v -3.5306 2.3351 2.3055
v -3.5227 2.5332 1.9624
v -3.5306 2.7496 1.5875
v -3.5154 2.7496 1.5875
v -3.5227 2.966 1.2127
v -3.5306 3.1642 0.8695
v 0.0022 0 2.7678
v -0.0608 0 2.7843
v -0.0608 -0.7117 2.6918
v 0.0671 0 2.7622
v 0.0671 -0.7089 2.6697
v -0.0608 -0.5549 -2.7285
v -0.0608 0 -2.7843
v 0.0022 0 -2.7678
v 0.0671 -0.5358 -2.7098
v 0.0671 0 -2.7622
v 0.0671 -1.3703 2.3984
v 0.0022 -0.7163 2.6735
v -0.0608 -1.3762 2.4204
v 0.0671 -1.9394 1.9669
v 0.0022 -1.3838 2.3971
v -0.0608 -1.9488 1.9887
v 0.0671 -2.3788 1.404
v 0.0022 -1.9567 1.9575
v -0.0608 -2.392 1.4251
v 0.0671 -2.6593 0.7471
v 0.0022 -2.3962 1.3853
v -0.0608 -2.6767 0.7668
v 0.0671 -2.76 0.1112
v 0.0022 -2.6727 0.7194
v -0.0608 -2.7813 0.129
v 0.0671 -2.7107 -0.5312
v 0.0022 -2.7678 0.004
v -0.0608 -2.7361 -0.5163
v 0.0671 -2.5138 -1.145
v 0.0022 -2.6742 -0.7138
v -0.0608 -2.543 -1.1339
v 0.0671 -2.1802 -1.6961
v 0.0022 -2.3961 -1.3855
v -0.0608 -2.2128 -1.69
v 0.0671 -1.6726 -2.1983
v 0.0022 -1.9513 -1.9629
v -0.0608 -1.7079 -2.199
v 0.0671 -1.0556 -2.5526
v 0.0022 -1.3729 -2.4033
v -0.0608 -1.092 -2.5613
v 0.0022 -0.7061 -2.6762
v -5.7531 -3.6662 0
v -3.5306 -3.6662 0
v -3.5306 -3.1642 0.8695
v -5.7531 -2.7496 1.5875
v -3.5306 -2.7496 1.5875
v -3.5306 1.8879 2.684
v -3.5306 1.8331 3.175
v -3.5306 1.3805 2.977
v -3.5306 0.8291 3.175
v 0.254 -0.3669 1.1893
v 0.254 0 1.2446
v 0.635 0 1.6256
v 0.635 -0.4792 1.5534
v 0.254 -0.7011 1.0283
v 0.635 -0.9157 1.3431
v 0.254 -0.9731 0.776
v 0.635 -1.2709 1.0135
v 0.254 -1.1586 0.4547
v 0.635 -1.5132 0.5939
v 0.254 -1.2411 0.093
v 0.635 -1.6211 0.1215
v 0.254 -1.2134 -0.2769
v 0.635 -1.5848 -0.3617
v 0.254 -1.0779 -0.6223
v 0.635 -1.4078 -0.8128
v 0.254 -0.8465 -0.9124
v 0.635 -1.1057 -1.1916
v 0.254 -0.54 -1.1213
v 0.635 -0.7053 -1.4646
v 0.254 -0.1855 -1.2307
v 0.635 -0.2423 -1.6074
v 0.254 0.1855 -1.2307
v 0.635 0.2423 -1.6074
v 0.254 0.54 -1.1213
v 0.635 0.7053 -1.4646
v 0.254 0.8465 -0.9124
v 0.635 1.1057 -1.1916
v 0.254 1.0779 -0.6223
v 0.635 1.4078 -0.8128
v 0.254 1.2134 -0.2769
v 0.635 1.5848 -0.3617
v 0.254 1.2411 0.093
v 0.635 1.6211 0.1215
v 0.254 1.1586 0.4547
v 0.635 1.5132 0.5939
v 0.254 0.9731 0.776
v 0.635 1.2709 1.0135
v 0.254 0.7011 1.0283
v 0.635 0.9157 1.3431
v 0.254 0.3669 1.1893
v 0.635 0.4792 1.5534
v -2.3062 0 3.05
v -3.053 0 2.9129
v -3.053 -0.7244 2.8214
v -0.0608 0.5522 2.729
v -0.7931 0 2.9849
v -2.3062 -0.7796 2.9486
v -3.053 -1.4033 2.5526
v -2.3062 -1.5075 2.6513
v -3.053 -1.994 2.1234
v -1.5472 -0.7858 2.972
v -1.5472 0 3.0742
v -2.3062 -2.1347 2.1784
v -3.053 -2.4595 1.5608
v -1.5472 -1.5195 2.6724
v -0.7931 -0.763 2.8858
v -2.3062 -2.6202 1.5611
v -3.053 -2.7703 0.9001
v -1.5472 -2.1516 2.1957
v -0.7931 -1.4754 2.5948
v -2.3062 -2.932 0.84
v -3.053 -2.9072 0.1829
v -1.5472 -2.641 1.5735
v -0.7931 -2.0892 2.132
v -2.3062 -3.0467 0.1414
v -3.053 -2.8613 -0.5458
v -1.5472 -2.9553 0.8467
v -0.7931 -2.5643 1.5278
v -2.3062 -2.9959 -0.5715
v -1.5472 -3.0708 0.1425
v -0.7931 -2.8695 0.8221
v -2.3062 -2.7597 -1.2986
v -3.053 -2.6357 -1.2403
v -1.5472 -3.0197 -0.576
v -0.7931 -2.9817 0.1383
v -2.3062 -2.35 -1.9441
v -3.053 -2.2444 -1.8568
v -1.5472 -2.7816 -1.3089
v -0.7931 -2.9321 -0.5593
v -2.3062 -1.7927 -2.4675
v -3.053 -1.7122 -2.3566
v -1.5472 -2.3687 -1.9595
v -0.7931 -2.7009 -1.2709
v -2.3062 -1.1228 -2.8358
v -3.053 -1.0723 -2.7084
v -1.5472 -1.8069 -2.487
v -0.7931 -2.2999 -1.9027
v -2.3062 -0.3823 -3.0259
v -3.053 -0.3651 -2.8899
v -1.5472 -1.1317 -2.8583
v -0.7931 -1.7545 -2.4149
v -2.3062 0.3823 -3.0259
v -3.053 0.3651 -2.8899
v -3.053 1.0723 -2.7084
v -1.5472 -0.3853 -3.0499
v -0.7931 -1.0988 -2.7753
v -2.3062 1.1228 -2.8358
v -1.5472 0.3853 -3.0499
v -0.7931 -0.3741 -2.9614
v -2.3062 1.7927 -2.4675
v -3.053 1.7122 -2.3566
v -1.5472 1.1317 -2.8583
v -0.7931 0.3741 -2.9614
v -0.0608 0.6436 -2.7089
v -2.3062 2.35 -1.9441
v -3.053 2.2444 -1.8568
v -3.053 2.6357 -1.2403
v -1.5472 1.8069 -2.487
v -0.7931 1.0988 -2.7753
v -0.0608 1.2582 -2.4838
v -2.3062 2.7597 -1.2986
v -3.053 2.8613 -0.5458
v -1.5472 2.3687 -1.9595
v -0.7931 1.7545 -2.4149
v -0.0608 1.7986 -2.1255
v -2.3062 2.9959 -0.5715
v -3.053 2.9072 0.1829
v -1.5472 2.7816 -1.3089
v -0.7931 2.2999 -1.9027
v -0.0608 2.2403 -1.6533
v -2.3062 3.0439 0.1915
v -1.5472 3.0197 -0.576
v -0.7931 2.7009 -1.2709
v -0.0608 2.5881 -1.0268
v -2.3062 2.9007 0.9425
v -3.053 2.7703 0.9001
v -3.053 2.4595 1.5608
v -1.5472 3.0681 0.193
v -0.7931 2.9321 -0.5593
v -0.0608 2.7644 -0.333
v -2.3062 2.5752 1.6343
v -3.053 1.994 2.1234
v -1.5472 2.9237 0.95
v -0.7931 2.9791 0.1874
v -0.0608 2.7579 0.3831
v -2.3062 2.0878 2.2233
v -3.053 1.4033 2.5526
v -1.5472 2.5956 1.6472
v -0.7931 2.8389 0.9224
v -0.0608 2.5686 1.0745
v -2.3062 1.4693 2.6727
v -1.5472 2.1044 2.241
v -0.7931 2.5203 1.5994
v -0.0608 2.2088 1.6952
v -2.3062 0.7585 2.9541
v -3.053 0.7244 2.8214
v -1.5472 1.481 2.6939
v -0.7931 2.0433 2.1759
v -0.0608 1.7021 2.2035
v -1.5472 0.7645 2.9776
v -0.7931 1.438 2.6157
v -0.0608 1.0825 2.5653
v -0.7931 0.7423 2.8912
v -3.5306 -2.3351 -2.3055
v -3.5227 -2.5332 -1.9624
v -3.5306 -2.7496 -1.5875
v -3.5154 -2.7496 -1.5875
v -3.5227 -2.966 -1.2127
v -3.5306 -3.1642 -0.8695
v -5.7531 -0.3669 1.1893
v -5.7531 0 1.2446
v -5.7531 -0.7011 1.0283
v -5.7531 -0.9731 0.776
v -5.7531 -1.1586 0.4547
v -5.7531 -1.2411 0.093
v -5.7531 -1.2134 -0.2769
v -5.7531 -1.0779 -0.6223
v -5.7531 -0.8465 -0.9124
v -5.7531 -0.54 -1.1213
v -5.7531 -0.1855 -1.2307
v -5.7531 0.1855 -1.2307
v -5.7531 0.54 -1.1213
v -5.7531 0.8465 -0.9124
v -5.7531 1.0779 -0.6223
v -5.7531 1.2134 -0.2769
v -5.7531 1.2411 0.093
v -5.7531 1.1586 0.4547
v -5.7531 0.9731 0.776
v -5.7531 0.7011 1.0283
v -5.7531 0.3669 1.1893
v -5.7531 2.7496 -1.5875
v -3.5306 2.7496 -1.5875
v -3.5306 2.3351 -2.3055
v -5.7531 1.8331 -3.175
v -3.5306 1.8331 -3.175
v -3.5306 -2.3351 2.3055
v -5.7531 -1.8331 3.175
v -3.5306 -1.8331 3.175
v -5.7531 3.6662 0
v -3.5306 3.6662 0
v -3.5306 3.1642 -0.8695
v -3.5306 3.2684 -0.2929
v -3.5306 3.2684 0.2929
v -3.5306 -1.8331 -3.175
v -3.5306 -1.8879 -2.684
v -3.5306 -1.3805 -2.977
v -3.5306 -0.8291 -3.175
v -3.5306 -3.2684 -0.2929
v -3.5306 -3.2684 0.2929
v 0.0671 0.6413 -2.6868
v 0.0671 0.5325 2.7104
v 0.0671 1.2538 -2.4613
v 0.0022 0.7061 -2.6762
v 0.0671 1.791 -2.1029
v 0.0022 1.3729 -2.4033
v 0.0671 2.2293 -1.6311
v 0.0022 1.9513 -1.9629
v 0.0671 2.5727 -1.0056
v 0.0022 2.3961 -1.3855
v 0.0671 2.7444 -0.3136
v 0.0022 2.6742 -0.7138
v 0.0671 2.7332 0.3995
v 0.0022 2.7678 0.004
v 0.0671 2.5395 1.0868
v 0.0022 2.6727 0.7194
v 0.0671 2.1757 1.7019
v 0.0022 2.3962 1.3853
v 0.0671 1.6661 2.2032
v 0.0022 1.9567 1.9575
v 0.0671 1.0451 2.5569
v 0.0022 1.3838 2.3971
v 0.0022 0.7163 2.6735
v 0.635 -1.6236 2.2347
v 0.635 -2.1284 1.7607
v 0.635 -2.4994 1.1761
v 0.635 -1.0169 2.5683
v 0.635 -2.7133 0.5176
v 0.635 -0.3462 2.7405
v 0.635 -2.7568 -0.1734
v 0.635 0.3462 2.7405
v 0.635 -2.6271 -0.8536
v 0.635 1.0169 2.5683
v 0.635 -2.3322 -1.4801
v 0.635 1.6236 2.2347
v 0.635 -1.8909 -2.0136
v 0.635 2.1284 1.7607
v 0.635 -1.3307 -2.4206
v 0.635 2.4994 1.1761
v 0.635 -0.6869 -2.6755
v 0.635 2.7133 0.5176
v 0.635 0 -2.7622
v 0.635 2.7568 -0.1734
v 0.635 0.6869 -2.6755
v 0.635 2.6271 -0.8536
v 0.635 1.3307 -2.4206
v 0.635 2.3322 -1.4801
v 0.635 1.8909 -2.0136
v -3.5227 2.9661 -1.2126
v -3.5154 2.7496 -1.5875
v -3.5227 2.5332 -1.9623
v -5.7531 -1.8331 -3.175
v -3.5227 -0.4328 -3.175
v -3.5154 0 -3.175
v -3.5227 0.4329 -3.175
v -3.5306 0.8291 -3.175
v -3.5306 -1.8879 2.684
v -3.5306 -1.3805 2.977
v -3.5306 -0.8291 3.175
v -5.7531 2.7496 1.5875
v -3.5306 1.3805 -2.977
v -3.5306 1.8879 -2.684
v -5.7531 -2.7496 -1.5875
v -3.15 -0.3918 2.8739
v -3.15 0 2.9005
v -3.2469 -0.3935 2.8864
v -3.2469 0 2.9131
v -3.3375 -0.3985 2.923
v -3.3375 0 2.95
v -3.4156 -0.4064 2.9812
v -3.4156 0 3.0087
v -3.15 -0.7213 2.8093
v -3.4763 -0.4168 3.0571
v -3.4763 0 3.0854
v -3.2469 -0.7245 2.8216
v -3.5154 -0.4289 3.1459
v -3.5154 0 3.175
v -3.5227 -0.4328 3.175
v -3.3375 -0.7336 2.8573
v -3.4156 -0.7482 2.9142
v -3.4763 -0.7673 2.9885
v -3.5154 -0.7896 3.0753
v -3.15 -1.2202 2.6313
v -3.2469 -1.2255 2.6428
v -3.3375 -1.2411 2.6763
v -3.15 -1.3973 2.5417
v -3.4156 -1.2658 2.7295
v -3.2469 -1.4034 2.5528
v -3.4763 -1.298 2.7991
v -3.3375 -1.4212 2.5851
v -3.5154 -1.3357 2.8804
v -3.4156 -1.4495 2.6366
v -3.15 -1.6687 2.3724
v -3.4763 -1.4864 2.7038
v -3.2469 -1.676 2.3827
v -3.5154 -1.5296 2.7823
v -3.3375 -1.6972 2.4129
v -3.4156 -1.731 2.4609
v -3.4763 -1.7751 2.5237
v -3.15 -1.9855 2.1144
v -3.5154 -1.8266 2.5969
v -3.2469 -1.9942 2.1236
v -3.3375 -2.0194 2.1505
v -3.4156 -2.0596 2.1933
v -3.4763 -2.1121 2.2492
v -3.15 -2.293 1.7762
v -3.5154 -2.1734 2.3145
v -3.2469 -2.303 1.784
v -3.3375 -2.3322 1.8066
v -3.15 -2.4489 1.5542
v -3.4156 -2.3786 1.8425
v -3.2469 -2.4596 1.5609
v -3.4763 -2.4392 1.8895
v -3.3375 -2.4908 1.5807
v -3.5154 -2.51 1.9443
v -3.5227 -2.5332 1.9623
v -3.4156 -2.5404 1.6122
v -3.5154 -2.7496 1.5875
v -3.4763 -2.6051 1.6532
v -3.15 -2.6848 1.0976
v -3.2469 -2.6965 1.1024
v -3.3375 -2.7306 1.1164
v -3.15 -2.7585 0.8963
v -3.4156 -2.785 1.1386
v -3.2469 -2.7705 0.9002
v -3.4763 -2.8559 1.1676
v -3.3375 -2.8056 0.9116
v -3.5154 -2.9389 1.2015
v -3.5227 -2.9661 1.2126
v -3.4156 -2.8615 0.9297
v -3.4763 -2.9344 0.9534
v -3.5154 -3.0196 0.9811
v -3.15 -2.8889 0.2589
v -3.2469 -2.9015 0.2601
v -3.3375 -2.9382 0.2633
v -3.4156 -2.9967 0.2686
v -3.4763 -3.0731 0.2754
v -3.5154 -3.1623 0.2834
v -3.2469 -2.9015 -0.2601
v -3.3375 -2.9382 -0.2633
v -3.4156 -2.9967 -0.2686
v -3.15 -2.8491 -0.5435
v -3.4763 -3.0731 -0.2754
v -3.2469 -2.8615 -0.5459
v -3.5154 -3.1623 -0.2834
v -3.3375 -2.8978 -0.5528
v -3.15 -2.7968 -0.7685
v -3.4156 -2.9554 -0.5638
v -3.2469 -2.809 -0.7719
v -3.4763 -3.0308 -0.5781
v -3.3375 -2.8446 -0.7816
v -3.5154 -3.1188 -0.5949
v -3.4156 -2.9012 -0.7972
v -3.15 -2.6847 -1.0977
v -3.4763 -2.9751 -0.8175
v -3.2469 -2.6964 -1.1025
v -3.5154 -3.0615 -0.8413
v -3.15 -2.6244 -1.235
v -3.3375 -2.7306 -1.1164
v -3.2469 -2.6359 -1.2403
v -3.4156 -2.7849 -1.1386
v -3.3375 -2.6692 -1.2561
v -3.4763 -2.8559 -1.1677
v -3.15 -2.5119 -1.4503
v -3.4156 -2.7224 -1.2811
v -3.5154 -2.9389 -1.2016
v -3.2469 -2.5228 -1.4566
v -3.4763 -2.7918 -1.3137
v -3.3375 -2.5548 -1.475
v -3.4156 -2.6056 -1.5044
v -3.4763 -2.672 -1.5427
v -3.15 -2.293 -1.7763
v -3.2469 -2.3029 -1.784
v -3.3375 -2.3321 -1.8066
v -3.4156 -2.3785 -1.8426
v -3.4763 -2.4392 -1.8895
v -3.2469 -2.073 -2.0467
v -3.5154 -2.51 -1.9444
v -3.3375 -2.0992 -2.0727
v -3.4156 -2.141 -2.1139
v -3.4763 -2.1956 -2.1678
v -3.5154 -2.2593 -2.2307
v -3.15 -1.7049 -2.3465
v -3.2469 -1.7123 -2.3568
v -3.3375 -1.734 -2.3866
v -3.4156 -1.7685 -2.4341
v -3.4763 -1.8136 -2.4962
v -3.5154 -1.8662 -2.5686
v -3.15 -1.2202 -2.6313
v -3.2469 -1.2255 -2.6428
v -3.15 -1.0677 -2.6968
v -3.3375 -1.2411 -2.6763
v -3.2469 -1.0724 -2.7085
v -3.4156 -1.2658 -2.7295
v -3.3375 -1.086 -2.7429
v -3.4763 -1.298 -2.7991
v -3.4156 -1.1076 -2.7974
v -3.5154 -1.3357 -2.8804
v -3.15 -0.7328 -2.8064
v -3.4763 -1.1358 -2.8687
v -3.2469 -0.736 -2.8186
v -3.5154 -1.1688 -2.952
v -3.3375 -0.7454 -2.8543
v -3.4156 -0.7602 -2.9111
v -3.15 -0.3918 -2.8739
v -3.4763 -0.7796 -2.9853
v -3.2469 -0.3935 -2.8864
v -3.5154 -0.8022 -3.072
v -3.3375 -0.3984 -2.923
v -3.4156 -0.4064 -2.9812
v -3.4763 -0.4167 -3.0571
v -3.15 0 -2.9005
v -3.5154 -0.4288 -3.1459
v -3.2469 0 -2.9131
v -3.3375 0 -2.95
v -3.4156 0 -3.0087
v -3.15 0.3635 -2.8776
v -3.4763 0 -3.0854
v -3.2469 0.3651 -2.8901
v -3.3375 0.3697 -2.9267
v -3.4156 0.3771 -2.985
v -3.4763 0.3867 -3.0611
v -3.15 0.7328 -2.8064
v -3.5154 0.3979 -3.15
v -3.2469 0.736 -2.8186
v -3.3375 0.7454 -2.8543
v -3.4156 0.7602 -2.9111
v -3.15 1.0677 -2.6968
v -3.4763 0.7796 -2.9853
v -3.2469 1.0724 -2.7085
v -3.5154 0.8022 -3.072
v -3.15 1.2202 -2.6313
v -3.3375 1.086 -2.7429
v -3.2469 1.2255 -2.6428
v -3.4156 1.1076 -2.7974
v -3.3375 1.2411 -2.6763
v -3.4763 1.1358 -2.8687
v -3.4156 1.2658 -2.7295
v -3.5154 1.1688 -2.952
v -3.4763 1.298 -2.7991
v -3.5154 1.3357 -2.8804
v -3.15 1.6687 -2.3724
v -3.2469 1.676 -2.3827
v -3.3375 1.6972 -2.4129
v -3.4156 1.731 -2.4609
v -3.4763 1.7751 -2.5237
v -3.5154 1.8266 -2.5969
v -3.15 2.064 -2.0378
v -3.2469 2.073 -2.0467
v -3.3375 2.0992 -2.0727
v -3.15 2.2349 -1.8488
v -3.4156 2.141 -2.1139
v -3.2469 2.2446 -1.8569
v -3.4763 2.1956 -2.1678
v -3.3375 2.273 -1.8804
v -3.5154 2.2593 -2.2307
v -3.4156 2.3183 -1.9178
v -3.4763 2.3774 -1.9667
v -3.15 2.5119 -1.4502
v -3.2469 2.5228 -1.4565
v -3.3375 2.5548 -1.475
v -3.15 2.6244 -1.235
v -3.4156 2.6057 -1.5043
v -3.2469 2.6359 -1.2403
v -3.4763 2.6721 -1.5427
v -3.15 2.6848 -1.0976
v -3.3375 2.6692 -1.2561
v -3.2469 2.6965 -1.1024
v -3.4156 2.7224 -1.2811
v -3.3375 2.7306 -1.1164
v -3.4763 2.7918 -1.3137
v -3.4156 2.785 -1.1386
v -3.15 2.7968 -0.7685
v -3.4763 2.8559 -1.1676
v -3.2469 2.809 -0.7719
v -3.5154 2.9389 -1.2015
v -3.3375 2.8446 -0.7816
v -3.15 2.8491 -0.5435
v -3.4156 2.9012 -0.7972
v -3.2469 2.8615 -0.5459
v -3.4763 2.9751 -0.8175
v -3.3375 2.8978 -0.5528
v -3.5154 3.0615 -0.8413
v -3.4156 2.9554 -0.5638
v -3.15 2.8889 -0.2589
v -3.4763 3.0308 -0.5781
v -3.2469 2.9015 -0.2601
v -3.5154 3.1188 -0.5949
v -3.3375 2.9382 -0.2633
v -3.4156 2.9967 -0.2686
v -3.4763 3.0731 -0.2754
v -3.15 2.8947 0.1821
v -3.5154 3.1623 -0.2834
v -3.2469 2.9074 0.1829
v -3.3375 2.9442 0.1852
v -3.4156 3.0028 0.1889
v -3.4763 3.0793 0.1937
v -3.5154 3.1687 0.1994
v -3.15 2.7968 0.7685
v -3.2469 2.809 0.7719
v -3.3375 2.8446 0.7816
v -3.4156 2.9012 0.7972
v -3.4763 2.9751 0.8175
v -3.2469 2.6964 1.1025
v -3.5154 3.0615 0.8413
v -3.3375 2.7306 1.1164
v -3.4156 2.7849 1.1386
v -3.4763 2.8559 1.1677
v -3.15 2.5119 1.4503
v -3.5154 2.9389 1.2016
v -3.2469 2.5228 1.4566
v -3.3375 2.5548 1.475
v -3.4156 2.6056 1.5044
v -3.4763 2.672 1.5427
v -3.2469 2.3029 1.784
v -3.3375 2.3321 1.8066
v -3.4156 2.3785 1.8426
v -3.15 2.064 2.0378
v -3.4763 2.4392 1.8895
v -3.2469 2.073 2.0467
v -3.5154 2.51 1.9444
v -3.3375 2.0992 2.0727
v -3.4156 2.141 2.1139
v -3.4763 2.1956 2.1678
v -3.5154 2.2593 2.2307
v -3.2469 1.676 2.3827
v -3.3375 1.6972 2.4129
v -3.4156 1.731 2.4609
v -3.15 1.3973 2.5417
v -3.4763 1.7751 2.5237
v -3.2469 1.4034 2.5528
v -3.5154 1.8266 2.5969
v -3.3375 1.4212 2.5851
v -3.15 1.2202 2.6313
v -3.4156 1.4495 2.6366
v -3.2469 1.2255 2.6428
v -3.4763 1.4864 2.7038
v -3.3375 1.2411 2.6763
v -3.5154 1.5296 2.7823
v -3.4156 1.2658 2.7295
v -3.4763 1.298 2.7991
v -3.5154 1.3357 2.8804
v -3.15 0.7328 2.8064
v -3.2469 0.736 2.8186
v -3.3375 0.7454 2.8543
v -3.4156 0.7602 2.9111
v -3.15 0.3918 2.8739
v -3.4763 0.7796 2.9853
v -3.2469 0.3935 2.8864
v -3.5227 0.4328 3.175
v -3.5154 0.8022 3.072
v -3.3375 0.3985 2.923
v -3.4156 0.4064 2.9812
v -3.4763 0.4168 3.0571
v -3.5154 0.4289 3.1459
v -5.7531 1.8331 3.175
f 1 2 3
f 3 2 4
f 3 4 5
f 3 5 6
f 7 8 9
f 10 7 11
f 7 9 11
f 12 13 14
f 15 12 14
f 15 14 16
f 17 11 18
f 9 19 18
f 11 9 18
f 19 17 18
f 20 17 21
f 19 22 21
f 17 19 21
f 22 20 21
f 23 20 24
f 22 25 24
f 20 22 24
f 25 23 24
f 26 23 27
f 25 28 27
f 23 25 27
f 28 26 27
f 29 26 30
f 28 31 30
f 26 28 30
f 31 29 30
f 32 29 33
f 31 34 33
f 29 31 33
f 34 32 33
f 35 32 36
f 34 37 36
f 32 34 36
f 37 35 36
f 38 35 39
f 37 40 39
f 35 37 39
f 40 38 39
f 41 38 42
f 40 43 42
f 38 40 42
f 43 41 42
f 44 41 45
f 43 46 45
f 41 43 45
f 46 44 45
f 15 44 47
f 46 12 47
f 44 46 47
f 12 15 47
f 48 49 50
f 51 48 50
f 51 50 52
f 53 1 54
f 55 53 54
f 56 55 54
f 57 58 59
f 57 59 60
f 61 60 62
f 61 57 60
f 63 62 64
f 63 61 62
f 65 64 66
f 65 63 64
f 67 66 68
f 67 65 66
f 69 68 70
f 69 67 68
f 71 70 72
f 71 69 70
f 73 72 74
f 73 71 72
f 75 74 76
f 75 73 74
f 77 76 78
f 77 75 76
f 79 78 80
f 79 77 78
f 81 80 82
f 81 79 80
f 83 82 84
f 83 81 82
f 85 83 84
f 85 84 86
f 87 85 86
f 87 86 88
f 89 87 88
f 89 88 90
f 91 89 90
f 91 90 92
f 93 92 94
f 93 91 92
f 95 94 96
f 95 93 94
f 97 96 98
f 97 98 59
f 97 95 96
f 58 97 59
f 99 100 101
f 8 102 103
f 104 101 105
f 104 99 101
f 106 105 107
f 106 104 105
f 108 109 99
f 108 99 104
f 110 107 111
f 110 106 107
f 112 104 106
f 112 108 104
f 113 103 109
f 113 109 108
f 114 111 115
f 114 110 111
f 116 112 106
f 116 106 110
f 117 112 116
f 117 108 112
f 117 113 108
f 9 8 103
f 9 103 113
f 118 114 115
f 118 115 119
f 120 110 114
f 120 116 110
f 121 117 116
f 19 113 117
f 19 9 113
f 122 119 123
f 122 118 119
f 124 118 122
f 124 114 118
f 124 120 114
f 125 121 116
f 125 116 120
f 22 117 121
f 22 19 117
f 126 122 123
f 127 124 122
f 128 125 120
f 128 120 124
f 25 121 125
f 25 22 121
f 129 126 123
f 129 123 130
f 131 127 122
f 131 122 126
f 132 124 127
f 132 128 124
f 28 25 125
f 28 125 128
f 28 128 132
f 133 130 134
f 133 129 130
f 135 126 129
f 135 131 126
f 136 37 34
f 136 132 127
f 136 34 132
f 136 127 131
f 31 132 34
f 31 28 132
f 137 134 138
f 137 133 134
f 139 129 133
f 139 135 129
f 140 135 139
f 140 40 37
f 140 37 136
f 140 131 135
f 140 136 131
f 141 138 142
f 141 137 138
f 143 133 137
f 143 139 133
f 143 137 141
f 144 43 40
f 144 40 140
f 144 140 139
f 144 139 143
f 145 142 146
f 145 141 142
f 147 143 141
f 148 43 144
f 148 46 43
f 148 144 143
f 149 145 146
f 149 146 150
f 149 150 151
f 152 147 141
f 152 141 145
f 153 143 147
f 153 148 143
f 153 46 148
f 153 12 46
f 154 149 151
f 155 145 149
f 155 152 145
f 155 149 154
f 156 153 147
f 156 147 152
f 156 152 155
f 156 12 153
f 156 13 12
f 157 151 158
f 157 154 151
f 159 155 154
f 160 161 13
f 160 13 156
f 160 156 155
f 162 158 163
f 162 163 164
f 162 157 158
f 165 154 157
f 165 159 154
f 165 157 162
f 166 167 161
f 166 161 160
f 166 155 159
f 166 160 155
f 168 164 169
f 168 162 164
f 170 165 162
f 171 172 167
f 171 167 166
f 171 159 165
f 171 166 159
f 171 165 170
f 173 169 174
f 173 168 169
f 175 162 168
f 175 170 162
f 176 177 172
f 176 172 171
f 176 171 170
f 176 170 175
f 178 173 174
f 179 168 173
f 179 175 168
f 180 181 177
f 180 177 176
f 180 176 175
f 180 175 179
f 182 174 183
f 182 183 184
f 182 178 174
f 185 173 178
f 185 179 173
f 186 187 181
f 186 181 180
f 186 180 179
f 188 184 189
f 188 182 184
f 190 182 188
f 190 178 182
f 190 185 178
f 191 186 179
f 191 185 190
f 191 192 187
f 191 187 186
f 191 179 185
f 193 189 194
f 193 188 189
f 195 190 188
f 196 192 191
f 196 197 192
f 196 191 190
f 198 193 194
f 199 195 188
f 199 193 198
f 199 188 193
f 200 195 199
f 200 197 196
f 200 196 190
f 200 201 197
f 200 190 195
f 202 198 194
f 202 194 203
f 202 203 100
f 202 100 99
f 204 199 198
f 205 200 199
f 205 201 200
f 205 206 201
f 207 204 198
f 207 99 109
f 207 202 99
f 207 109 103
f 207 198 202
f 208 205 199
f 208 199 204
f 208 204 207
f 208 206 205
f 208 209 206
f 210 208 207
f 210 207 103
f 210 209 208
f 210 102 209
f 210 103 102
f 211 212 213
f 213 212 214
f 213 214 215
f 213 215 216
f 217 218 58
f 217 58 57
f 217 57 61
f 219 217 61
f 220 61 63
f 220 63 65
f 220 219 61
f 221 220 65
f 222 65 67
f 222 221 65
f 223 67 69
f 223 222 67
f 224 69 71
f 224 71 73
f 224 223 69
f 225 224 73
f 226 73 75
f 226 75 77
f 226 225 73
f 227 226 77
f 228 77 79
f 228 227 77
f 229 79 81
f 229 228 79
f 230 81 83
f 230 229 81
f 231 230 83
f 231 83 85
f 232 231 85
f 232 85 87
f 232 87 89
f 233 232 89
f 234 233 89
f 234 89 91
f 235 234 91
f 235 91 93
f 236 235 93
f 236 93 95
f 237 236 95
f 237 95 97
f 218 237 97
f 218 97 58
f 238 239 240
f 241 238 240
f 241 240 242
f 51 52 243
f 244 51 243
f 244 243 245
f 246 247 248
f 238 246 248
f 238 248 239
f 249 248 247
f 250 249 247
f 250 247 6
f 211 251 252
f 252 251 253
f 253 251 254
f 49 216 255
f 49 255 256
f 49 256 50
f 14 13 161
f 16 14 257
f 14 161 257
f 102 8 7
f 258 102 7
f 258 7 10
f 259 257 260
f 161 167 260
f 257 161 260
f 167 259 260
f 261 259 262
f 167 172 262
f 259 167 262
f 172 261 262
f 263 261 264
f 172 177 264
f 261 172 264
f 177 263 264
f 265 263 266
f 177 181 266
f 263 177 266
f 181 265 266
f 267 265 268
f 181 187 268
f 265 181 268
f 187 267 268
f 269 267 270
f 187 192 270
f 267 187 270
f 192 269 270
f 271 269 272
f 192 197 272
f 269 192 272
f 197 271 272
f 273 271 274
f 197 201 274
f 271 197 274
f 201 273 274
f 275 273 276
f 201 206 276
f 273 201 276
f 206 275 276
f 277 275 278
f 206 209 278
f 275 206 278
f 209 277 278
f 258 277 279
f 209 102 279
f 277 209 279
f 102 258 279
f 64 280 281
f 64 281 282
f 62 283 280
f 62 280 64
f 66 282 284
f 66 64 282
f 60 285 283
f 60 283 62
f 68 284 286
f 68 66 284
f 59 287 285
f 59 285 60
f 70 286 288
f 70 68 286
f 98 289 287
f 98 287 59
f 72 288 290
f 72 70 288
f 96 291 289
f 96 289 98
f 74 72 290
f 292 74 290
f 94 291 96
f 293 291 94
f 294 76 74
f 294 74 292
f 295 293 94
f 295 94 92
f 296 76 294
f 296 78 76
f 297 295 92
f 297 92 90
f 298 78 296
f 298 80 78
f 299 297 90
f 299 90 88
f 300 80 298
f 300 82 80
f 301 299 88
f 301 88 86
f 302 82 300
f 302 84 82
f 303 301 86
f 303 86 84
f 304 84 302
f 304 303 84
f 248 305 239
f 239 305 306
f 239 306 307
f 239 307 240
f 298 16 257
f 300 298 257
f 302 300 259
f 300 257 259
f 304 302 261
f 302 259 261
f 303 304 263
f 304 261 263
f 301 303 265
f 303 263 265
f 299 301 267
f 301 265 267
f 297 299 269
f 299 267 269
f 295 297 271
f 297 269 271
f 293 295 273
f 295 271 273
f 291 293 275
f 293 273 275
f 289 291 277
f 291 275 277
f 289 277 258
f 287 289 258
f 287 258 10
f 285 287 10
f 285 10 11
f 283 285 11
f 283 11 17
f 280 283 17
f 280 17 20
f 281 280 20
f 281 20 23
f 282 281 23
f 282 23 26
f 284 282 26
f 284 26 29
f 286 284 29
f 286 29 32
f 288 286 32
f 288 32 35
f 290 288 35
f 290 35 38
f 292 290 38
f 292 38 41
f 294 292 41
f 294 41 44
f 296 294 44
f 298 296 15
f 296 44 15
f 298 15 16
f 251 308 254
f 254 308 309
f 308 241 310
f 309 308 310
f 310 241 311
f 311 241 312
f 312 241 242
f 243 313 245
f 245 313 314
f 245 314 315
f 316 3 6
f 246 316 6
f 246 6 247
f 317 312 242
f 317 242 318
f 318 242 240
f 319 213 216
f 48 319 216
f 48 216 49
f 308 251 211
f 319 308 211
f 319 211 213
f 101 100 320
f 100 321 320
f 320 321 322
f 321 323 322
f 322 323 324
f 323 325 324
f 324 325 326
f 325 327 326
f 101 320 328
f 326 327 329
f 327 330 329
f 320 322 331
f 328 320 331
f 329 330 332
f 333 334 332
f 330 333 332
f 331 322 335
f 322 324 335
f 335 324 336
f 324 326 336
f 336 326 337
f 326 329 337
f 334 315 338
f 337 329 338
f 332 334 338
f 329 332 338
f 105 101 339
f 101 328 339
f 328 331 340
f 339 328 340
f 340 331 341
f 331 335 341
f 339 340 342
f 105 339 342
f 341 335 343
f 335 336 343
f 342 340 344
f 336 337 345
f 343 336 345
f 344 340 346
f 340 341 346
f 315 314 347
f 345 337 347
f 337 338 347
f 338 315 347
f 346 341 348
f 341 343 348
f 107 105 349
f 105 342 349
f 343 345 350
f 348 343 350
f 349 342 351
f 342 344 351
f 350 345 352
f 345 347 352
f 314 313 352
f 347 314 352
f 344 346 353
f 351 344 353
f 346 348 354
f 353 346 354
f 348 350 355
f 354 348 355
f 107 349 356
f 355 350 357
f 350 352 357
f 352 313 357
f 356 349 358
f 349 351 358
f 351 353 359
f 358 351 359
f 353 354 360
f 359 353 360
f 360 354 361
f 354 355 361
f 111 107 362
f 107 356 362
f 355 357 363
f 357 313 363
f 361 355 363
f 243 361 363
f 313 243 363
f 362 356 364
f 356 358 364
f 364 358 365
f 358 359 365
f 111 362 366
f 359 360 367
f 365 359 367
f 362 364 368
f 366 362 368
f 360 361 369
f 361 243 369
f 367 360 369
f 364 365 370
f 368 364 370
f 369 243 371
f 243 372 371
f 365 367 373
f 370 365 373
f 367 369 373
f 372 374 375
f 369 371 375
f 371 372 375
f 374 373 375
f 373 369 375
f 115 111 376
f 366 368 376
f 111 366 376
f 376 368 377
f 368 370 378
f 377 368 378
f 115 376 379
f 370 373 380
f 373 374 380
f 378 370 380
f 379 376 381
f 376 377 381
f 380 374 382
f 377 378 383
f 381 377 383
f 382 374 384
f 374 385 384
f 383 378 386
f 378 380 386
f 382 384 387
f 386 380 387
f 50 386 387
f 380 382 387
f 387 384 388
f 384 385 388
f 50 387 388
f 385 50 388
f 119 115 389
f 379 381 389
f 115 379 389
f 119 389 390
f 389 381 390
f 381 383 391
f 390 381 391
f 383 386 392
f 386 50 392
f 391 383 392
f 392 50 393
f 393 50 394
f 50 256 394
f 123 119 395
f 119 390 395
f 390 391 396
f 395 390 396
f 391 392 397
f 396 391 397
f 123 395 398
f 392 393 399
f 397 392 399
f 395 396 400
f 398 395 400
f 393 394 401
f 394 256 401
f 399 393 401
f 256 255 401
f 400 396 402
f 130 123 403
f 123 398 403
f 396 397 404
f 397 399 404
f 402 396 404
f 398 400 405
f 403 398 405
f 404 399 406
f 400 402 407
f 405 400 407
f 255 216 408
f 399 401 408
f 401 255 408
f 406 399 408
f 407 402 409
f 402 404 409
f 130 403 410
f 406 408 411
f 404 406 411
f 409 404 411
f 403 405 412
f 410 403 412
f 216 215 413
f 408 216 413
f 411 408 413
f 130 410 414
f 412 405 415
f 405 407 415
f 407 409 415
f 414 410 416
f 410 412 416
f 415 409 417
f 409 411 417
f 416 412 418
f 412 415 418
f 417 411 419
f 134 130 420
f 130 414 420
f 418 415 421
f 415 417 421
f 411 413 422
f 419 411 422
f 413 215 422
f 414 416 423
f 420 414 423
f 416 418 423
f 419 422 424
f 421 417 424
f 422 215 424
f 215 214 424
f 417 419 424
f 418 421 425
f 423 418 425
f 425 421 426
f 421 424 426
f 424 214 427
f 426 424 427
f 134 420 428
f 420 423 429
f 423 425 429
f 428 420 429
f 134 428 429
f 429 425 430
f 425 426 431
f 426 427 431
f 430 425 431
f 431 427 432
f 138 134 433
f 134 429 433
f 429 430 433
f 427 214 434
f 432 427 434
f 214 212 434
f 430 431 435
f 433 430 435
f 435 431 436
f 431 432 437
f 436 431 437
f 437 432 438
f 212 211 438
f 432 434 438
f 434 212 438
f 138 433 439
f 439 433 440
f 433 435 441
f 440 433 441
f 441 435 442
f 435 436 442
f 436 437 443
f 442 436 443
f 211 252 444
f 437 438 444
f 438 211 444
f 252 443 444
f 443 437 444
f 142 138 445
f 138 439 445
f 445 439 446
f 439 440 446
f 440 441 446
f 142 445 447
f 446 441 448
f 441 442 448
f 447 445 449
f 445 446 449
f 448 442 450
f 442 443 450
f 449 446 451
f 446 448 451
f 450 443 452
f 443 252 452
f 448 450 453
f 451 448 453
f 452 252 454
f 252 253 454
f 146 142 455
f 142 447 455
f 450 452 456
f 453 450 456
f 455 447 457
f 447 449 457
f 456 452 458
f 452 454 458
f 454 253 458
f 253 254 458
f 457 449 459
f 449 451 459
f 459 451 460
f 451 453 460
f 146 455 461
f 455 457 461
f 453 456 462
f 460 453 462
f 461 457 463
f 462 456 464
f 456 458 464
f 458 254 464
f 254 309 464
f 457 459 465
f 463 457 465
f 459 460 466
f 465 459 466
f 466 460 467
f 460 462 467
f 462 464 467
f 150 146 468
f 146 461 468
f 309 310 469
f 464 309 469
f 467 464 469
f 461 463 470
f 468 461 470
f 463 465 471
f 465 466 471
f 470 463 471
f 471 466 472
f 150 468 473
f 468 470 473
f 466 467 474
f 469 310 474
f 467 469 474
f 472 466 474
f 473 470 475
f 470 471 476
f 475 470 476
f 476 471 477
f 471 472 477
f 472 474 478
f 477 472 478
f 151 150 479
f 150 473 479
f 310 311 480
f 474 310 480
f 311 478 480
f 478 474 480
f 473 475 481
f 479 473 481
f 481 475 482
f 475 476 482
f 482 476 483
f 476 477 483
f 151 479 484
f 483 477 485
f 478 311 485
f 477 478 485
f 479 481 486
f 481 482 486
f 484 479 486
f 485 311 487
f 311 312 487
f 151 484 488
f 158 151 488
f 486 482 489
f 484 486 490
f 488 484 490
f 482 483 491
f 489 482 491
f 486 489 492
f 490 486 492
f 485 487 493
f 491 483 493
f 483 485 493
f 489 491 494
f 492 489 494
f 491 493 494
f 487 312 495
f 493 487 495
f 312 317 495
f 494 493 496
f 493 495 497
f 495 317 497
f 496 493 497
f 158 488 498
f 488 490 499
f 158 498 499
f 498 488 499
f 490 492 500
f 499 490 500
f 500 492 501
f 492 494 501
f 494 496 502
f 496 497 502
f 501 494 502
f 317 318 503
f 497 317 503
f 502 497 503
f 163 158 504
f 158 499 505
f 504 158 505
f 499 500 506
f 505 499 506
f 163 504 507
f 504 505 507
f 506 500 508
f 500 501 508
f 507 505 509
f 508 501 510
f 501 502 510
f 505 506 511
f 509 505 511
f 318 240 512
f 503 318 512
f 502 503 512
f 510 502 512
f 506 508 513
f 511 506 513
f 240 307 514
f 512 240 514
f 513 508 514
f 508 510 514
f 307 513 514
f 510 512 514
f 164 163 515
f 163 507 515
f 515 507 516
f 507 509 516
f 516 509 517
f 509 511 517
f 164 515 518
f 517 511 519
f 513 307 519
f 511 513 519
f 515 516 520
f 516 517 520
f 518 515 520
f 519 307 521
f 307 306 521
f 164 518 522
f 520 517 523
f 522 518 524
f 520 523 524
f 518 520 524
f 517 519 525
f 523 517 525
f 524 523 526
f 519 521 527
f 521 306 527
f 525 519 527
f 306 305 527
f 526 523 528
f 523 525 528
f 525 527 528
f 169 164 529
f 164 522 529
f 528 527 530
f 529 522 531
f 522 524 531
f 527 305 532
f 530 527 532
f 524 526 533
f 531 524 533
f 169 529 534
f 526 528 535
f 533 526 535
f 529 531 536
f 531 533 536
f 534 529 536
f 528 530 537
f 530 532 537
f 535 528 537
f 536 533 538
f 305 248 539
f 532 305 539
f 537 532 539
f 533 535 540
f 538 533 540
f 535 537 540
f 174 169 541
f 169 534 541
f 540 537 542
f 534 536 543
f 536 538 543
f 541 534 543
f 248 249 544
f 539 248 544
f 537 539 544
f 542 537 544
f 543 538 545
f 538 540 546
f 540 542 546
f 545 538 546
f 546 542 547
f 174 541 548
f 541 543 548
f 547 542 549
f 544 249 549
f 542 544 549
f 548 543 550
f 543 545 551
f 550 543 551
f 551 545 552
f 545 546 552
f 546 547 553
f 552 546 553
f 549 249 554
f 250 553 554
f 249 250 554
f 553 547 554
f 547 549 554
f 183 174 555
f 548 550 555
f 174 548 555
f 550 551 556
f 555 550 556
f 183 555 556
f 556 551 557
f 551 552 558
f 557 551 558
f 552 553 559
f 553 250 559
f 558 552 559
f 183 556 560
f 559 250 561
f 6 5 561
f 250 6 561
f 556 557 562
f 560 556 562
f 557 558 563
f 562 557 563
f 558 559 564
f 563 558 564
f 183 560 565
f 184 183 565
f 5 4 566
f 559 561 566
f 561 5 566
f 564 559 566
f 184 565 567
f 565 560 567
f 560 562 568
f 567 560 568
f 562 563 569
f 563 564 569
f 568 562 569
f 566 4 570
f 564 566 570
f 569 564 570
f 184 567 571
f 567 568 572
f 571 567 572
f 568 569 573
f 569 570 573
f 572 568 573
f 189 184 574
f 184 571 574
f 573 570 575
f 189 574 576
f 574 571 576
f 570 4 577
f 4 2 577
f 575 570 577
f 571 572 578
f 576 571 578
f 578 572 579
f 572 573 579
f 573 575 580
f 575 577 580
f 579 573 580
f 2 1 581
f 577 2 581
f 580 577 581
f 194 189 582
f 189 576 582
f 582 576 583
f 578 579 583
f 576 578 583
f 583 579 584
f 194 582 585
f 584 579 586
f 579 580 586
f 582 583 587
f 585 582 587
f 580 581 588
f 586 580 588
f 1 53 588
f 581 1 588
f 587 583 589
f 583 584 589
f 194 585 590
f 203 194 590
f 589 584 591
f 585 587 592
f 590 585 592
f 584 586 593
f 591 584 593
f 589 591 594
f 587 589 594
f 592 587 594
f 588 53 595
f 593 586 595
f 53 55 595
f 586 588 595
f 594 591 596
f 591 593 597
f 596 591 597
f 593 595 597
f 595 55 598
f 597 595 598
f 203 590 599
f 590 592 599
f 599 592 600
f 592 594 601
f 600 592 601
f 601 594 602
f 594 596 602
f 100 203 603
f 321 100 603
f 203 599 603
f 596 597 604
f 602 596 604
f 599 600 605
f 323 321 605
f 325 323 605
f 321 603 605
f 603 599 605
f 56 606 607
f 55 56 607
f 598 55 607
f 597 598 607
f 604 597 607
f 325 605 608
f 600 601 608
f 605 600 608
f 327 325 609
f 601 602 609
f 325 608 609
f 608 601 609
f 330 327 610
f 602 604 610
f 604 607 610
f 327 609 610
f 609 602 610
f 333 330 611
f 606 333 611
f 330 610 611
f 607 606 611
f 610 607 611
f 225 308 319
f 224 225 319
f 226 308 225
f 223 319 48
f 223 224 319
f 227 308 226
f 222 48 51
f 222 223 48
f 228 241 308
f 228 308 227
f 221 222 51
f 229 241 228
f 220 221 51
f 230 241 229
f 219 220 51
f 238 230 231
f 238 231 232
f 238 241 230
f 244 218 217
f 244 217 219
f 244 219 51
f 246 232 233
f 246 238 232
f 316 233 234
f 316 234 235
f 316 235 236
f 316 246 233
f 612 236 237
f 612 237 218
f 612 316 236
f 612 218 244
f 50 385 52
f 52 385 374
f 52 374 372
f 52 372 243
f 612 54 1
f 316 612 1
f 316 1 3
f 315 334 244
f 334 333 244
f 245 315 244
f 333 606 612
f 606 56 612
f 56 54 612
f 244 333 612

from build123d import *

# Parameters (mm, degrees)
BOSS_EXTRUDE1_START = -2.2225
SKETCH2_R           = 3.175
SKETCH2_R_2         = 1.2446
BOSS_EXTRUDE1_DEPTH = 2.2225
SKETCH3_R           = 2.76225
SKETCH3_R_2         = 1.2446
BOSS_EXTRUDE2_DEPTH = 0.635
FILLET1_R           = 0.381
FILLET2_R           = 0.381
CHAMFER1_SIZE       = 0.381


with BuildPart() as part:
    # Sketch1 → Revolve1 (revolve)
    with BuildSketch(Plane.XY, mode=Mode.PRIVATE) as revolve1_sk:
        with BuildLine():
            Line((0, 1.2446), (-5.7531, 1.2446))
            Line((-5.7531, 1.2446), (-5.7531, 3.175))
            Line((-5.7531, 3.175), (-3.5306, 3.175))
            Line((-3.5306, 3.175), (-3.5306, 2.76225))
            ThreePointArc((-3.5306, 2.76225), (-1.7653, 3.078835688), (0, 2.76225))
            Line((0, 2.76225), (0, 1.2446))
        make_face()
    revolve(revolve1_sk.sketch.rotate(Axis((-60.338913039, 0, 0), (1, 0, 0)), 90), axis=Axis((-60.338913039, 0, 0), (1, 0, 0)))

    # Sketch2 → Boss-Extrude1 (add)
    # profile 1 of 7: a face of its own
    with BuildSketch(Plane.ZY.offset(5.7531).offset(BOSS_EXTRUDE1_START)):
        with BuildLine():
            ThreePointArc((-1.587499996, 2.749630659), (1.5e-08, 3.175), (1.587500022, 2.749630644))
            Line((1.587500022, 2.749630644), (0, 3.666174209))
            Line((0, 3.666174209), (-1.587499996, 2.749630659))
        make_face()
    # profile 2 of 7: a face of its own
    with BuildSketch(Plane.ZY.offset(5.7531).offset(BOSS_EXTRUDE1_START)):
        with BuildLine():
            ThreePointArc((1.587500022, 2.749630644), (2.749630663, 1.587499989), (3.175, 0))
            Line((3.175, 0), (3.175, 1.833087105))
            Line((3.175, 1.833087105), (1.587500022, 2.749630644))
        make_face()
    # profile 3 of 7: a face of its own
    with BuildSketch(Plane.ZY.offset(5.7531).offset(BOSS_EXTRUDE1_START)):
        with BuildLine():
            Line((1.587500022, -2.749630644), (3.175, -1.833087105))
            Line((3.175, -1.833087105), (3.175, 0))
            ThreePointArc((3.175, 0), (2.749630663, -1.587499989), (1.587500022, -2.749630644))
        make_face()
    # profile 4 of 7: a face of its own
    with BuildSketch(Plane.ZY.offset(5.7531).offset(BOSS_EXTRUDE1_START)):
        with BuildLine():
            Line((0, -3.666174209), (1.587500022, -2.749630644))
            ThreePointArc((1.587500022, -2.749630644), (3.9e-08, -3.175), (-1.587499954, -2.749630684))
            Line((-1.587499954, -2.749630684), (0, -3.666174209))
        make_face()
    # profile 5 of 7: a face of its own
    with BuildSketch(Plane.ZY.offset(5.7531).offset(BOSS_EXTRUDE1_START)):
        with BuildLine():
            Line((-3.175, -1.833087105), (-1.587499954, -2.749630684))
            ThreePointArc((-1.587499954, -2.749630684), (-2.749630644, -1.587500023), (-3.175, 0))
            Line((-3.175, 0), (-3.175, -1.833087105))
        make_face()
    # profile 6 of 7: a face of its own
    with BuildSketch(Plane.ZY.offset(5.7531).offset(BOSS_EXTRUDE1_START)):
        with BuildLine():
            ThreePointArc((-3.175, 0), (-2.749630656, 1.587500002), (-1.587499996, 2.749630659))
            Line((-1.587499996, 2.749630659), (-3.175, 1.833087105))
            Line((-3.175, 1.833087105), (-3.175, 0))
        make_face()
    # profile 7 of 7: a face of its own
    with BuildSketch(Plane.ZY.offset(5.7531).offset(BOSS_EXTRUDE1_START)):
        Circle(SKETCH2_R)
        Circle(SKETCH2_R_2, mode=Mode.SUBTRACT)
    extrude(amount=BOSS_EXTRUDE1_DEPTH)

    # Sketch3 → Boss-Extrude2 (add)
    with BuildSketch(Plane(origin=(0, 0, 0), x_dir=(0, 0, -1), z_dir=(1, 0, 0))):
        Circle(SKETCH3_R)
        with Locations(Location((0, 0, 0), (0, 0, 180))):
            Circle(SKETCH3_R_2, mode=Mode.SUBTRACT)
    extrude(amount=BOSS_EXTRUDE2_DEPTH)

    # Fillet1
    # the kernel refuses this fillet: 0.381 mm, written as the material it adds along each edge
    with BuildSketch(Plane(origin=(-3.5306, 0, 0), x_dir=(0, 0, 1), z_dir=(0, 1, 0))) as fillet1_piece_1_section:
        with BuildLine():
            CenterArc((3.281470874, 0.381), FILLET1_R, 165.315967452, 104.684032548)
            Line((3.281470874, 0), (2.76225, 0))
            ThreePointArc((2.76225, 0), (2.84347095, 0.236931857), (2.912914931, 0.47757907))
        make_face()
    fillet1_piece_1 = revolve(axis=Axis((-3.5306, 0, 0), (1, 0, 0)), mode=Mode.PRIVATE)
    fillet1_piece_1 = split(fillet1_piece_1, bisect_by=Plane(origin=(-3.388915245, -4.036268752, -0.641022551), z_dir=(0, 0.8660254037844388, -0.49999999999999983)), keep=Keep.TOP, mode=Mode.PRIVATE)
    fillet1_piece_1 = split(fillet1_piece_1, bisect_by=Plane(origin=(-3.388915245, -1.462992562, -3.816022551), z_dir=(0, 0.8660254037844387, 0.5)), keep=Keep.TOP, mode=Mode.PRIVATE)
    fillet1_piece_1 = split(fillet1_piece_1, bisect_by=Plane(origin=(-3.388915245, 0, -3.175), z_dir=(0, 0, 1)), keep=Keep.TOP, mode=Mode.PRIVATE)
    fillet1_piece_1 = split(fillet1_piece_1, bisect_by=Plane(origin=(-3.388915245, 1.462992562, -3.816022551), z_dir=(0, -0.8660254037844387, 0.49999999999999994)), keep=Keep.TOP, mode=Mode.PRIVATE)
    fillet1_piece_1 = split(fillet1_piece_1, bisect_by=Plane(origin=(-3.388915245, 4.036268752, -0.641022551), z_dir=(0, -0.8660254037844387, -0.49999999999999983)), keep=Keep.TOP, mode=Mode.PRIVATE)
    fillet1_piece_1 = split(fillet1_piece_1, bisect_by=Plane(origin=(-3.388915245, 0, 3.175), z_dir=(0, 0, -1)), keep=Keep.TOP, mode=Mode.PRIVATE)
    add(fillet1_piece_1)

    # Fillet2
    fillet2_edges = [part.edges().sort_by_distance(p)[0] for p in [
        (0, -2.76225, 0),
    ]]
    fillet(fillet2_edges, radius=FILLET2_R)

    # Chamfer1
    chamfer1_edges = [part.edges().sort_by_distance(p)[0] for p in [
        (0.635, 0, -1.2446),
    ]]
    chamfer(chamfer1_edges, length=CHAMFER1_SIZE)


solid = part.part
